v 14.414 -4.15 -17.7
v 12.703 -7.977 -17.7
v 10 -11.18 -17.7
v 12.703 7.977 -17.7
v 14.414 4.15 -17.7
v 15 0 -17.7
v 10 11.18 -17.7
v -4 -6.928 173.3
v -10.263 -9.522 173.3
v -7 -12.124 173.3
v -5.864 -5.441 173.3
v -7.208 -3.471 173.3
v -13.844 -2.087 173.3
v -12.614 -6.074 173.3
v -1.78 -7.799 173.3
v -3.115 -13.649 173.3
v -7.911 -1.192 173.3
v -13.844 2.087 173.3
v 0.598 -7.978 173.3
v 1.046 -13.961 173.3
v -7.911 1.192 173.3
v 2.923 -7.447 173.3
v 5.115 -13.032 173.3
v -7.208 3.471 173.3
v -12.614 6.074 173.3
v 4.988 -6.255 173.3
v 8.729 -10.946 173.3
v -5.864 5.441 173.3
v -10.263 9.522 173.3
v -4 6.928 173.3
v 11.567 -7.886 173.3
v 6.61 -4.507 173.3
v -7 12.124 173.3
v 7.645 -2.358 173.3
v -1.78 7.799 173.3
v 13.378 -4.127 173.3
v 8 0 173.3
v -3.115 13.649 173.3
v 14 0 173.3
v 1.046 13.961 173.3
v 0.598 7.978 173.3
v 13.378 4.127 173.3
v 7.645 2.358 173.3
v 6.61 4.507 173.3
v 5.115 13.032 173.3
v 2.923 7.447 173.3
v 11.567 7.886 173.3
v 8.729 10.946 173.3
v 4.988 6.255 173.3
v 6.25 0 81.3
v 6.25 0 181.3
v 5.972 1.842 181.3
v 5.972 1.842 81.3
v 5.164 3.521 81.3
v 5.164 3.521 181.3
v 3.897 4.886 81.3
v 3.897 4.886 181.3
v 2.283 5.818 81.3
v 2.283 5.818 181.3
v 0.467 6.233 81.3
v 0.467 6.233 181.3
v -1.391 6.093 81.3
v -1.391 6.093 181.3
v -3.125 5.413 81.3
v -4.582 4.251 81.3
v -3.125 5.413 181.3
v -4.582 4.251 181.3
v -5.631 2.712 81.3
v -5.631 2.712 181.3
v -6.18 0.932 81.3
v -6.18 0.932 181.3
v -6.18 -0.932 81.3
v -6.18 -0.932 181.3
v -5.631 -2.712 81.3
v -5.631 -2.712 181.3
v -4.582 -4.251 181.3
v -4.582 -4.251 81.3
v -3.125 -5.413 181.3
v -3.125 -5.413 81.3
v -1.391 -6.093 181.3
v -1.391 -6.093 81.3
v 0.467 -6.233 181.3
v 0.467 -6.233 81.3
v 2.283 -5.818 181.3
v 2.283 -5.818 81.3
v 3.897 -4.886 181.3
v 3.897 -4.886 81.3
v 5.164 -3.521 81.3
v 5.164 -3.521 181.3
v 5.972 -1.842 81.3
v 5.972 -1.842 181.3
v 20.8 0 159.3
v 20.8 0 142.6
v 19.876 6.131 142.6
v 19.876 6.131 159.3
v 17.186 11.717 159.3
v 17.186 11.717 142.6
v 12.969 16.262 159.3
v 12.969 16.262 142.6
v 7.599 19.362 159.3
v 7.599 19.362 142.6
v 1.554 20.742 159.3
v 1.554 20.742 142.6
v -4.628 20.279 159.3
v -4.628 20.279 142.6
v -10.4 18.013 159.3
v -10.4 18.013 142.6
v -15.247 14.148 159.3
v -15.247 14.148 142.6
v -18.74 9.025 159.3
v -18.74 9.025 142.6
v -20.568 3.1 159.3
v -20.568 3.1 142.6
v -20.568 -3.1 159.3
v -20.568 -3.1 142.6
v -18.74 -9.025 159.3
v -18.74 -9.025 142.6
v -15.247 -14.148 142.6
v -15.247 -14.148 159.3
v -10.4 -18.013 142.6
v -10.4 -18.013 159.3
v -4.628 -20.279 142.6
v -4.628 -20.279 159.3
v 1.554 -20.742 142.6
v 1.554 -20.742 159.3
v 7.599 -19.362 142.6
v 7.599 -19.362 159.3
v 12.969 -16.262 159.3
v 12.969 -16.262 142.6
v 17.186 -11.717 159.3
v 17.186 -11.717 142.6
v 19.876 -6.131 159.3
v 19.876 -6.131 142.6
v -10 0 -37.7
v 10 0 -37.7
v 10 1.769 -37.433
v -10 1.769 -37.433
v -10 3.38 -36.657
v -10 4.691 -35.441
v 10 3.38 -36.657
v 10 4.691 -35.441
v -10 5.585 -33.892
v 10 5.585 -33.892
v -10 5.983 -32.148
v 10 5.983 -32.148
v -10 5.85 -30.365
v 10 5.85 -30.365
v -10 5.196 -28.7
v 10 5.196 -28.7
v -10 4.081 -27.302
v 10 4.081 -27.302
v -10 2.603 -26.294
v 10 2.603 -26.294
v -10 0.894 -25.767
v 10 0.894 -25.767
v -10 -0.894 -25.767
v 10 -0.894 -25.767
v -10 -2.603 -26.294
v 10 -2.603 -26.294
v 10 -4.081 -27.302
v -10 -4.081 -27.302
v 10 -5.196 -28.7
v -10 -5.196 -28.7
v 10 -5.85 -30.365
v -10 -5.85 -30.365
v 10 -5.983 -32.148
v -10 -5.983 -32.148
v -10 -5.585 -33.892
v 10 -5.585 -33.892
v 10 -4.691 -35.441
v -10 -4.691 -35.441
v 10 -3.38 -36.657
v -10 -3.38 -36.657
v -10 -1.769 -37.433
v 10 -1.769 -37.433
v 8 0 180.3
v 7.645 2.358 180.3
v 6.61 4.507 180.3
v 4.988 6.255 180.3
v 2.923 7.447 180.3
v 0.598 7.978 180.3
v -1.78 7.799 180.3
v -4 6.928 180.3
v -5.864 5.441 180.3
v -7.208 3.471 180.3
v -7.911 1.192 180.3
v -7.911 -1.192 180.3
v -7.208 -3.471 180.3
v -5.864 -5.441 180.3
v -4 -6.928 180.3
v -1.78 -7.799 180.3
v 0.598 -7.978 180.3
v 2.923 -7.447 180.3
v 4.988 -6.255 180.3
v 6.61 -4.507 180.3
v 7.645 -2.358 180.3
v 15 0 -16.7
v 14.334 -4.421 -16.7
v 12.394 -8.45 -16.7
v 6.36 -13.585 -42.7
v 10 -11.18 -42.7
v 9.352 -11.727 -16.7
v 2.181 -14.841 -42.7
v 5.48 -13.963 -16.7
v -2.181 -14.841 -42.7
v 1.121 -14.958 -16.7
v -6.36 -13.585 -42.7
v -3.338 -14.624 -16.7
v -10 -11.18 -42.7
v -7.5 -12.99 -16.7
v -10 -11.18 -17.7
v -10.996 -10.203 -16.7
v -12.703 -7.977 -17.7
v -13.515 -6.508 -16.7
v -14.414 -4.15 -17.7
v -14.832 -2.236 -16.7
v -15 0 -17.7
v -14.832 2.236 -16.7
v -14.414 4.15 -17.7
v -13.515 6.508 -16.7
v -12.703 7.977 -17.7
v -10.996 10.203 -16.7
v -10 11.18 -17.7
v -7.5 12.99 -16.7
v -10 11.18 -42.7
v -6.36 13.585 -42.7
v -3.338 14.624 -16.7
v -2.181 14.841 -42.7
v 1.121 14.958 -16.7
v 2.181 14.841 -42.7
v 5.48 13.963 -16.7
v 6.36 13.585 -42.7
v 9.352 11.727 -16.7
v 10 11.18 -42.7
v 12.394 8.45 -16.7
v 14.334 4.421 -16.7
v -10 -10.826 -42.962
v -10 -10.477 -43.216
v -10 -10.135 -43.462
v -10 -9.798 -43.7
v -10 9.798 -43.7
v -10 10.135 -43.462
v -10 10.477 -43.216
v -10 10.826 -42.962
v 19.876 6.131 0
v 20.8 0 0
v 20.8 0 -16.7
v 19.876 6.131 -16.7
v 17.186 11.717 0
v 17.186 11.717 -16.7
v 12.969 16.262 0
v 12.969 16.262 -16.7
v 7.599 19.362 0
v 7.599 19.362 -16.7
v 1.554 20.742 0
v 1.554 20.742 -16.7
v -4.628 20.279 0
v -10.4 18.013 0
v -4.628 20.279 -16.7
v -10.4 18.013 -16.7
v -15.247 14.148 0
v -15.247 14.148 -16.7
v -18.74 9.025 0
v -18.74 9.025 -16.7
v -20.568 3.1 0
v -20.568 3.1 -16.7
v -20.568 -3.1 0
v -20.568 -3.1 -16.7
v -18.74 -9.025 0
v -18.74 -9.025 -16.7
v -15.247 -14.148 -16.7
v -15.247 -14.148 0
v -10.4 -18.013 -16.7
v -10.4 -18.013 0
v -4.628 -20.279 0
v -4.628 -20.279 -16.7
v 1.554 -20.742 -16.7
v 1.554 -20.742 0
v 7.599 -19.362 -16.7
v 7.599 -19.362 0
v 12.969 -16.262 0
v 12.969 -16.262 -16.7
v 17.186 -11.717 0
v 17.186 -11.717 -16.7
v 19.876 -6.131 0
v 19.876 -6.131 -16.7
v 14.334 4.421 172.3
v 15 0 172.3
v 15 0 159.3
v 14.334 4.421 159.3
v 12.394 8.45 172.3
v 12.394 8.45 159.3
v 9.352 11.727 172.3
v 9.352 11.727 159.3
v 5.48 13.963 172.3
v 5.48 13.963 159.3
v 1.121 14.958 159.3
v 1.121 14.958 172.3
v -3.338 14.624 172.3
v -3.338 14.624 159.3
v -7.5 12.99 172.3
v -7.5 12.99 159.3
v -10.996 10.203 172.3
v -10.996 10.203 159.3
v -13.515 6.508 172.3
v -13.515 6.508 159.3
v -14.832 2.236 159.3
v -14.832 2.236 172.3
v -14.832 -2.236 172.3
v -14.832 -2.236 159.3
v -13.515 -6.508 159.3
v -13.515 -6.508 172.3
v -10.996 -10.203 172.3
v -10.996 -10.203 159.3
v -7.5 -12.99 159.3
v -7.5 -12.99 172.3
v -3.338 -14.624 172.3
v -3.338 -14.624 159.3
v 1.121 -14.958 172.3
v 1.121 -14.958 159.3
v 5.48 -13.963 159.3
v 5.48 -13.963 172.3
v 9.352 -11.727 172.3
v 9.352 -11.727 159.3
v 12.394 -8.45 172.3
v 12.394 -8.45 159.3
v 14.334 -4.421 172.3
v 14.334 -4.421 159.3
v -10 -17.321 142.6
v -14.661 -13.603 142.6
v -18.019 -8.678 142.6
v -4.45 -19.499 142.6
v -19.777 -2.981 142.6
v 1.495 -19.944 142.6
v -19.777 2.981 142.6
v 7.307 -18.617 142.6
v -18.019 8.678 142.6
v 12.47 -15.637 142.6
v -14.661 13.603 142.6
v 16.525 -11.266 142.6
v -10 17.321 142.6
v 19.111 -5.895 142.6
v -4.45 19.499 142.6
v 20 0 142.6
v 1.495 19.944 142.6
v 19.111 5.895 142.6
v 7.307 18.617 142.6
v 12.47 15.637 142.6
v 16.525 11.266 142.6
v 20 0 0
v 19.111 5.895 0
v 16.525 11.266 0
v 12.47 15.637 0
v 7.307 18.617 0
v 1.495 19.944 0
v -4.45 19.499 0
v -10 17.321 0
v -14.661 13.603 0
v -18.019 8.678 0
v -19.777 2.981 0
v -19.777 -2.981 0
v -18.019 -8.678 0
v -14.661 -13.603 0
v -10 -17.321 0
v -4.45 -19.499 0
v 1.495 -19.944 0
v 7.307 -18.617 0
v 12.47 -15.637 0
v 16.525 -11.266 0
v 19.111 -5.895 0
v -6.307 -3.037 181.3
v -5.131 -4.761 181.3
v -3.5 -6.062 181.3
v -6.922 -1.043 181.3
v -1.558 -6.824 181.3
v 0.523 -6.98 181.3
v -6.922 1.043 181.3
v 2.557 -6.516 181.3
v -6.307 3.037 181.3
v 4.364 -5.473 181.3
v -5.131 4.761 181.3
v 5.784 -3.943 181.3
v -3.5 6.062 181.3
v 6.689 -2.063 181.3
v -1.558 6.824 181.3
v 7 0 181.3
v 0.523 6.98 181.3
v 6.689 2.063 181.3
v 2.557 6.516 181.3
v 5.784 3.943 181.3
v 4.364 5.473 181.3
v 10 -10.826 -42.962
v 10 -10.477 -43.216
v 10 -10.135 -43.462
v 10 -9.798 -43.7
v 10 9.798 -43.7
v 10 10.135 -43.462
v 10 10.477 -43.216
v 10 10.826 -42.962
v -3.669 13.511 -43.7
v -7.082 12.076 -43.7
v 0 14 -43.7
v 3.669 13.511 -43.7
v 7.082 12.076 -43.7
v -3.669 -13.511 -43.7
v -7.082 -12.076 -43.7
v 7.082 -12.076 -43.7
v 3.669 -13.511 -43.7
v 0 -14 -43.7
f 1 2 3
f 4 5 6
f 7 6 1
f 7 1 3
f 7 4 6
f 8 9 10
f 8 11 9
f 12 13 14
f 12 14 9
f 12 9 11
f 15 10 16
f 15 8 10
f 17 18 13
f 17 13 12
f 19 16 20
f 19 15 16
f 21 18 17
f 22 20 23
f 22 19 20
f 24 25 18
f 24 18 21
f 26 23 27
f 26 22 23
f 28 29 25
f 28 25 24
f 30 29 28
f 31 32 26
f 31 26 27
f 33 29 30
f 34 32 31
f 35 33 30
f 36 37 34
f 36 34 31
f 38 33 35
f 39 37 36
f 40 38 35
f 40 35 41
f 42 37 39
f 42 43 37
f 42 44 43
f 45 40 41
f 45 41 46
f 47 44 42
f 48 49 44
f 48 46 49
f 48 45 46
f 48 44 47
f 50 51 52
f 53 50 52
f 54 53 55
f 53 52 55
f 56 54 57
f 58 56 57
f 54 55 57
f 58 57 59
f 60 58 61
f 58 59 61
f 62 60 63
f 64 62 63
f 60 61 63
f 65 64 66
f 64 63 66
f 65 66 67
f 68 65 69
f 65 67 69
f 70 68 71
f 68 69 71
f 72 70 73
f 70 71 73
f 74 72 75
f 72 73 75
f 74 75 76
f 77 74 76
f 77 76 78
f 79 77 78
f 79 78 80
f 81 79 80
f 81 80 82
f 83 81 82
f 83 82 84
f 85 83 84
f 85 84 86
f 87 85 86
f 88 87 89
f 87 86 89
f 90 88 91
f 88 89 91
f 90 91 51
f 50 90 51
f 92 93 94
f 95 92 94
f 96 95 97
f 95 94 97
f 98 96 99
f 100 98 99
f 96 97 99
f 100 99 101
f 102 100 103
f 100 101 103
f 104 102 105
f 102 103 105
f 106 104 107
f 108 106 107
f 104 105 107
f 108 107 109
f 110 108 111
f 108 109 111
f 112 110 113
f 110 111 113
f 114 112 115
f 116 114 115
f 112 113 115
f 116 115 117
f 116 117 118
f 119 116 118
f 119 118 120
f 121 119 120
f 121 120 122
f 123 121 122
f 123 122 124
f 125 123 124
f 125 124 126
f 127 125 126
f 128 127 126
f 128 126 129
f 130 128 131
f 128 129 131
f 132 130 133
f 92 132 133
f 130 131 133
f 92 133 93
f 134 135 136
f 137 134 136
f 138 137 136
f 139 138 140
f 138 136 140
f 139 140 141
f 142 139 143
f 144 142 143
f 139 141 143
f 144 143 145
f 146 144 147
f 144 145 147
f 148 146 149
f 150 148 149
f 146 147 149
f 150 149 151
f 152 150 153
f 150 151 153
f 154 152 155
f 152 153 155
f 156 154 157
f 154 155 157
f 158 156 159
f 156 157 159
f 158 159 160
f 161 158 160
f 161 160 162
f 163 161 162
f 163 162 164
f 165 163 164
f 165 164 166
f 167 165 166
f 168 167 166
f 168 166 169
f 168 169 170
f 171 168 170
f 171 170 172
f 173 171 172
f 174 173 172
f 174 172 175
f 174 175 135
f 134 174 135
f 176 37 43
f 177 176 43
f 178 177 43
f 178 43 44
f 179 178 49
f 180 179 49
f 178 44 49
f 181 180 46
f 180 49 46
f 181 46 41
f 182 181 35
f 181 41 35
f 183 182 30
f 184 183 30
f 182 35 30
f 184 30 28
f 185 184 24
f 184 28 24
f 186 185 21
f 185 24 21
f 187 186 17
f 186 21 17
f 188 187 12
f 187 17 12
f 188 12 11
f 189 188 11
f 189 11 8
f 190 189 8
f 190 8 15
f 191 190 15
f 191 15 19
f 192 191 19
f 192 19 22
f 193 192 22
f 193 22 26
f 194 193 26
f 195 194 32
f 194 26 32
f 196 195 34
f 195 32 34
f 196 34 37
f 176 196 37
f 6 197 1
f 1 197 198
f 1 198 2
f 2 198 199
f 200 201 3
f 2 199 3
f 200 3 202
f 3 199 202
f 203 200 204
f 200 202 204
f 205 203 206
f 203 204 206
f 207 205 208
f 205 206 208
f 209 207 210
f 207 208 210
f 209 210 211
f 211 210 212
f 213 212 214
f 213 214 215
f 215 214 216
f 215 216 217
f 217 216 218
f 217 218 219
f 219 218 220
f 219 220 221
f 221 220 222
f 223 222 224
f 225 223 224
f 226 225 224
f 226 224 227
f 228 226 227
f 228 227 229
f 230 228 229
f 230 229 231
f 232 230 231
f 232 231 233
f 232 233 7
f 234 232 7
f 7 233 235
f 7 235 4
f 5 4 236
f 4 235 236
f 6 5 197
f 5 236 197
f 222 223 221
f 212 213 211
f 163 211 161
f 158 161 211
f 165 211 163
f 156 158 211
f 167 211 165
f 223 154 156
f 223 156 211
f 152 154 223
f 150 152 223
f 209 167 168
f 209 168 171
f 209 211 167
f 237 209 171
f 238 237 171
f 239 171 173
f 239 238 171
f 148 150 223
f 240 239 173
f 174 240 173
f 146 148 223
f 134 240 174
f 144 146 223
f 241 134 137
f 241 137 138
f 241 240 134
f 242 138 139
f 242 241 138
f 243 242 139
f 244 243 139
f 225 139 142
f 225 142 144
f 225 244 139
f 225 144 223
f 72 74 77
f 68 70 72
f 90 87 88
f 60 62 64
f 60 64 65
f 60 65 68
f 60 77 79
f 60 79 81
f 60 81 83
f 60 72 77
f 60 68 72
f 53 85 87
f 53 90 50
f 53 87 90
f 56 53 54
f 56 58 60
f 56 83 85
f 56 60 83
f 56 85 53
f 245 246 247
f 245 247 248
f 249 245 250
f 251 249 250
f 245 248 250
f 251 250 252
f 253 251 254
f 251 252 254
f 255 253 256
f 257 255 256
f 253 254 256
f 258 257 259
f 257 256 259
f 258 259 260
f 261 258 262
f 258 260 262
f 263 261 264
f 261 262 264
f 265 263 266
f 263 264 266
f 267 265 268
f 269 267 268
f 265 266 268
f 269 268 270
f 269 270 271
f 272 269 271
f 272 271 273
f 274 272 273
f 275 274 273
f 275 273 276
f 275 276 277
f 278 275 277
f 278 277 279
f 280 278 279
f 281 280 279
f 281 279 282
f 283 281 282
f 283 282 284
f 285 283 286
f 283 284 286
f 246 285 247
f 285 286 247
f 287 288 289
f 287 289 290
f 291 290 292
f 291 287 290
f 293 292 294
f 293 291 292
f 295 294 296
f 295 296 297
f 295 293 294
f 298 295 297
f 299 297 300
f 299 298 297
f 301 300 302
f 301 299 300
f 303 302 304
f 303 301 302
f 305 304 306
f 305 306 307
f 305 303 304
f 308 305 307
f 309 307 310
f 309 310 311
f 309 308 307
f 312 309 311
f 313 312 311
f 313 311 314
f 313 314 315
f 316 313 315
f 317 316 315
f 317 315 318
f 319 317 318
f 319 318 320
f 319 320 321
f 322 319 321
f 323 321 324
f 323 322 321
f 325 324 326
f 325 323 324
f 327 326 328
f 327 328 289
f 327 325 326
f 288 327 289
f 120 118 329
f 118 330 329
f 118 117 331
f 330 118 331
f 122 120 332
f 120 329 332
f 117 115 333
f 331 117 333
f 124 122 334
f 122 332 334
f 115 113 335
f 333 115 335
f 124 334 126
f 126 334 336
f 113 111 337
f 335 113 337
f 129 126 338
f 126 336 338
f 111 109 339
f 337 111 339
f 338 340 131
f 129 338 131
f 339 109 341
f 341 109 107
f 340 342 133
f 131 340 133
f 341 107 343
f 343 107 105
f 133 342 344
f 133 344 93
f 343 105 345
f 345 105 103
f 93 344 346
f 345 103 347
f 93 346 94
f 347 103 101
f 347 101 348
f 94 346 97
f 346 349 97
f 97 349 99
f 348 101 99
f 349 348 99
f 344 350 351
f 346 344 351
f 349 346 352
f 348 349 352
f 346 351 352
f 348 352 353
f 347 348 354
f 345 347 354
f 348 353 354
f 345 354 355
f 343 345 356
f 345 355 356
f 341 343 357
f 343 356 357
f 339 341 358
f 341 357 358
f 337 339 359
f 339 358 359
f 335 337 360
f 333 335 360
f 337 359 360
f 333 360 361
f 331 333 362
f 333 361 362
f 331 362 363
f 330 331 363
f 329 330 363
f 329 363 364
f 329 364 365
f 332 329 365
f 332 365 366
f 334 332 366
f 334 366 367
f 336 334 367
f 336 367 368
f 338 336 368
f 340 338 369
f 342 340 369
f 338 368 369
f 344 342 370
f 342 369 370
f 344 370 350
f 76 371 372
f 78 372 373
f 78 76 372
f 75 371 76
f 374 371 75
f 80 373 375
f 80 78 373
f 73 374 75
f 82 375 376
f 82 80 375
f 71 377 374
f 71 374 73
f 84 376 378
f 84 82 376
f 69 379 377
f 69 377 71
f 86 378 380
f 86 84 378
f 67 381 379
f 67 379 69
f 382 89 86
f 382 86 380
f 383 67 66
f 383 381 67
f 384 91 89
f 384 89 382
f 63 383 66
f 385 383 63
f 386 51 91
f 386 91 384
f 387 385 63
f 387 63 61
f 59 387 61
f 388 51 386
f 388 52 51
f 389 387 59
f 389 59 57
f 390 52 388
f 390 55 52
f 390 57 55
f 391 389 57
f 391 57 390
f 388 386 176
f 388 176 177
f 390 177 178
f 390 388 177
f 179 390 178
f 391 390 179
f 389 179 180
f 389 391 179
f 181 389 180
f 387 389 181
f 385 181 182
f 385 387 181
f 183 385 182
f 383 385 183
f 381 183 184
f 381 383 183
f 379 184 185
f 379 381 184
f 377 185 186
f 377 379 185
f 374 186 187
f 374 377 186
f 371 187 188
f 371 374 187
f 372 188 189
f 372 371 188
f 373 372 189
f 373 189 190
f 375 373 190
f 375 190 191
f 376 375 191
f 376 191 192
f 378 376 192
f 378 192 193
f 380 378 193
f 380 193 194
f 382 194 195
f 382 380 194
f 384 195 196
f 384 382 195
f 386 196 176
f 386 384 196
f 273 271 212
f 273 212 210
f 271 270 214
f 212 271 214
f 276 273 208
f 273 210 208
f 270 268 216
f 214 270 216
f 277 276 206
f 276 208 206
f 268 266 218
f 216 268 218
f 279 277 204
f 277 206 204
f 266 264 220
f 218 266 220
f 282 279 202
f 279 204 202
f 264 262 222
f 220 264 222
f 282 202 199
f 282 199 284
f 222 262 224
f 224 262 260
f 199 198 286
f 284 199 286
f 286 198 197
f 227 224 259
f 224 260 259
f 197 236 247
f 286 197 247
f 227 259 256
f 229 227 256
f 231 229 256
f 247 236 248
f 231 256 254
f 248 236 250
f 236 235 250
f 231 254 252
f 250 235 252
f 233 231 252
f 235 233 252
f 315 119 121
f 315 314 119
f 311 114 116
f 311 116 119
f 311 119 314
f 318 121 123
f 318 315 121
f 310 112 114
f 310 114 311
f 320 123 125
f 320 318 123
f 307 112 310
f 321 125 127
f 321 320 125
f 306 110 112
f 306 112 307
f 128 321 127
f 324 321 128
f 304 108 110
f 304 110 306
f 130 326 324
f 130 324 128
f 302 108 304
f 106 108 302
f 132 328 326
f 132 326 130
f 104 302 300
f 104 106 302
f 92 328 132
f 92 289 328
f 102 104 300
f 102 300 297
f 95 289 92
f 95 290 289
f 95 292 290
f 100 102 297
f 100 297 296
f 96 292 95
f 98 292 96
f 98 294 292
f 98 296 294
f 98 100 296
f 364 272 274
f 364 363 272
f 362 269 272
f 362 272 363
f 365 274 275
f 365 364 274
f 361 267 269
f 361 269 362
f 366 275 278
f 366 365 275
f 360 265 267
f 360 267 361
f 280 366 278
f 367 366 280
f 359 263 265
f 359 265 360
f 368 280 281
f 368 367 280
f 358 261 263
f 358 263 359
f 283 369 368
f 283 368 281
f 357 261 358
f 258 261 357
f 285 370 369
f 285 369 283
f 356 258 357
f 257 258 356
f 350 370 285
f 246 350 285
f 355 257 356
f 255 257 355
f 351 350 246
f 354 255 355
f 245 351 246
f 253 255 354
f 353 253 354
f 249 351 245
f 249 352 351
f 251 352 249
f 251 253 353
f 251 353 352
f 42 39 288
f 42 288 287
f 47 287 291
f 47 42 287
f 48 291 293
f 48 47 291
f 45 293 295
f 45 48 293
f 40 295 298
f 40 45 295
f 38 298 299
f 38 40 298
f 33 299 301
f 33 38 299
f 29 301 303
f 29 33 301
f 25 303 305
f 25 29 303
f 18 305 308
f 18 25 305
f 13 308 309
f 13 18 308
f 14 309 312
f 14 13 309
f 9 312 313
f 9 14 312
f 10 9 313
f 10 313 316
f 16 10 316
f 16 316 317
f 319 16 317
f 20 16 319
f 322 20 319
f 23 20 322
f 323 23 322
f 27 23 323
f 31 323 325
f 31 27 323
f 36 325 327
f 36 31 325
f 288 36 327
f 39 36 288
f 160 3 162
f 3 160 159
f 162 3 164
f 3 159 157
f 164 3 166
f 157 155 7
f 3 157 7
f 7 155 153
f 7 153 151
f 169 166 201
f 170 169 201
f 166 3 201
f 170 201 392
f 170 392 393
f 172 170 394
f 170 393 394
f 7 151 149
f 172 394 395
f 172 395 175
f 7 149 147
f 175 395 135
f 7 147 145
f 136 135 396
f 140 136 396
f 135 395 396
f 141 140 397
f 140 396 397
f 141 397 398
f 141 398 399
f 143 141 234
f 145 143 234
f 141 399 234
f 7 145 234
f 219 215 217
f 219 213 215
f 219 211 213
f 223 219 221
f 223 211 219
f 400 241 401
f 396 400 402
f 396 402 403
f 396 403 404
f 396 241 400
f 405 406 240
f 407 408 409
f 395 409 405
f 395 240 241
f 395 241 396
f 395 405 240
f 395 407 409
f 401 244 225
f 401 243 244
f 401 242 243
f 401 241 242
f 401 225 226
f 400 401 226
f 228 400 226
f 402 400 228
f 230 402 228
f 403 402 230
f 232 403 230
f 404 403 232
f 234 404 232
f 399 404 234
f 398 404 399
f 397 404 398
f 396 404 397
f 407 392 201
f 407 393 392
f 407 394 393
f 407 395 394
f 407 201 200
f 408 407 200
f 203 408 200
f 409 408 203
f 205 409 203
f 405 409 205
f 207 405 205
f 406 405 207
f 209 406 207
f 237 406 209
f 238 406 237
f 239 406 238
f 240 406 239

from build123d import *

# Parameters (mm, degrees)
ESQUISSE1_R             = 20
BOSS_EXTRU_1_DEPTH      = 142.6
ESQUISSE2_R             = 20.8
BOSS_EXTRU_2_DEPTH      = 16.7
BOSS_EXTRU_5_START      = -159.3
ESQUISSE2_3_R           = 20.8
BOSS_EXTRU_5_DEPTH      = 16.7
ESQUISSE3_R             = 15
BOSS_EXTRU_6_DEPTH      = 27
ESQUISSE4_W             = 6
ESQUISSE4_H             = 30
ENL_V_MAT_EXTRU_1_DEPTH = 26
ESQUISSE5_R             = 6
ENL_V_MAT_EXTRU_2_DEPTH = 164.578024196
CHANFREIN1_SIZE         = 1
BOSS_EXTRU_7_START      = 14
ESQUISSE6_R             = 15
BOSS_EXTRU_7_DEPTH      = 14
ESQUISSE7_R             = 8
BOSS_EXTRU_8_DEPTH      = 8
CHANFREIN3_SIZE         = 1
ESQUISSE9_R             = 6.25
ENL_V_MAT_EXTRU_3_DEPTH = 100


with BuildPart() as part:
    # Esquisse1 → Boss.-Extru.1 (new body)
    with BuildSketch(Plane.XY):
        Circle(ESQUISSE1_R)
    extrude(amount=BOSS_EXTRU_1_DEPTH)

    # Esquisse2 → Boss.-Extru.2 (add)
    with BuildSketch(Plane.XY.offset(142.6)):
        Circle(ESQUISSE2_R)
    extrude(amount=BOSS_EXTRU_2_DEPTH)

    # Esquisse2<3> → Boss.-Extru.5 (add)
    with BuildSketch(Plane.XY.offset(142.6).offset(BOSS_EXTRU_5_START)):
        Circle(ESQUISSE2_3_R)
    extrude(amount=BOSS_EXTRU_5_DEPTH)

    # Esquisse3 → Boss.-Extru.6 (add)
    with BuildSketch(Plane(origin=(0, 0, -16.7), x_dir=(-1, 0, 0), z_dir=(0, 0, -1))):
        Circle(ESQUISSE3_R)
    extrude(amount=BOSS_EXTRU_6_DEPTH)

    # Esquisse4 → Enlèv. mat.-Extru.1 (cut)
    with BuildSketch(Plane(origin=(0, 0, -43.7), x_dir=(-1, 0, 0), z_dir=(0, 0, -1))):
        with Locations((-13, 0)):
            Rectangle(ESQUISSE4_W, ESQUISSE4_H)
        with Locations((13, 0)):
            Rectangle(ESQUISSE4_W, ESQUISSE4_H)
    extrude(amount=-ENL_V_MAT_EXTRU_1_DEPTH, mode=Mode.SUBTRACT)

    # Esquisse5 → Enlèv. mat.-Extru.2 (cut, through all)
    with BuildSketch(Plane(origin=(10, 0, 0), x_dir=(0, 0, -1), z_dir=(1, 0, 0))):
        with Locations((31.7, 0)):
            Circle(ESQUISSE5_R)
    extrude(amount=-ENL_V_MAT_EXTRU_2_DEPTH, mode=Mode.SUBTRACT)

    # Chanfrein1
    chanfrein1_edges = [part.edges().sort_by_distance(p)[0] for p in [
        (0, 15, -43.7),
        (0, -15, -43.7),
    ]]
    chamfer(chanfrein1_edges, length=CHANFREIN1_SIZE)

    # Esquisse6 → Boss.-Extru.7 (add)
    with BuildSketch(Plane.XY.offset(159.3).offset(BOSS_EXTRU_7_START)):
        Circle(ESQUISSE6_R)
    extrude(amount=-BOSS_EXTRU_7_DEPTH)

    # Esquisse7 → Boss.-Extru.8 (add)
    with BuildSketch(Plane.XY.offset(173.3)):
        Circle(ESQUISSE7_R)
    extrude(amount=BOSS_EXTRU_8_DEPTH)

    # Chanfrein3
    chanfrein3_edges = [part.edges().sort_by_distance(p)[0] for p in [
        (-8, 0, 181.3),
        (-15, 0, 173.3),
    ]]
    chamfer(chanfrein3_edges, length=CHANFREIN3_SIZE)

    # Esquisse9 → Enlèv. mat.-Extru.3 (cut)
    with BuildSketch(Plane.XY.offset(181.3)):
        Circle(ESQUISSE9_R)
    extrude(amount=-ENL_V_MAT_EXTRU_3_DEPTH, mode=Mode.SUBTRACT)


solid = part.part
